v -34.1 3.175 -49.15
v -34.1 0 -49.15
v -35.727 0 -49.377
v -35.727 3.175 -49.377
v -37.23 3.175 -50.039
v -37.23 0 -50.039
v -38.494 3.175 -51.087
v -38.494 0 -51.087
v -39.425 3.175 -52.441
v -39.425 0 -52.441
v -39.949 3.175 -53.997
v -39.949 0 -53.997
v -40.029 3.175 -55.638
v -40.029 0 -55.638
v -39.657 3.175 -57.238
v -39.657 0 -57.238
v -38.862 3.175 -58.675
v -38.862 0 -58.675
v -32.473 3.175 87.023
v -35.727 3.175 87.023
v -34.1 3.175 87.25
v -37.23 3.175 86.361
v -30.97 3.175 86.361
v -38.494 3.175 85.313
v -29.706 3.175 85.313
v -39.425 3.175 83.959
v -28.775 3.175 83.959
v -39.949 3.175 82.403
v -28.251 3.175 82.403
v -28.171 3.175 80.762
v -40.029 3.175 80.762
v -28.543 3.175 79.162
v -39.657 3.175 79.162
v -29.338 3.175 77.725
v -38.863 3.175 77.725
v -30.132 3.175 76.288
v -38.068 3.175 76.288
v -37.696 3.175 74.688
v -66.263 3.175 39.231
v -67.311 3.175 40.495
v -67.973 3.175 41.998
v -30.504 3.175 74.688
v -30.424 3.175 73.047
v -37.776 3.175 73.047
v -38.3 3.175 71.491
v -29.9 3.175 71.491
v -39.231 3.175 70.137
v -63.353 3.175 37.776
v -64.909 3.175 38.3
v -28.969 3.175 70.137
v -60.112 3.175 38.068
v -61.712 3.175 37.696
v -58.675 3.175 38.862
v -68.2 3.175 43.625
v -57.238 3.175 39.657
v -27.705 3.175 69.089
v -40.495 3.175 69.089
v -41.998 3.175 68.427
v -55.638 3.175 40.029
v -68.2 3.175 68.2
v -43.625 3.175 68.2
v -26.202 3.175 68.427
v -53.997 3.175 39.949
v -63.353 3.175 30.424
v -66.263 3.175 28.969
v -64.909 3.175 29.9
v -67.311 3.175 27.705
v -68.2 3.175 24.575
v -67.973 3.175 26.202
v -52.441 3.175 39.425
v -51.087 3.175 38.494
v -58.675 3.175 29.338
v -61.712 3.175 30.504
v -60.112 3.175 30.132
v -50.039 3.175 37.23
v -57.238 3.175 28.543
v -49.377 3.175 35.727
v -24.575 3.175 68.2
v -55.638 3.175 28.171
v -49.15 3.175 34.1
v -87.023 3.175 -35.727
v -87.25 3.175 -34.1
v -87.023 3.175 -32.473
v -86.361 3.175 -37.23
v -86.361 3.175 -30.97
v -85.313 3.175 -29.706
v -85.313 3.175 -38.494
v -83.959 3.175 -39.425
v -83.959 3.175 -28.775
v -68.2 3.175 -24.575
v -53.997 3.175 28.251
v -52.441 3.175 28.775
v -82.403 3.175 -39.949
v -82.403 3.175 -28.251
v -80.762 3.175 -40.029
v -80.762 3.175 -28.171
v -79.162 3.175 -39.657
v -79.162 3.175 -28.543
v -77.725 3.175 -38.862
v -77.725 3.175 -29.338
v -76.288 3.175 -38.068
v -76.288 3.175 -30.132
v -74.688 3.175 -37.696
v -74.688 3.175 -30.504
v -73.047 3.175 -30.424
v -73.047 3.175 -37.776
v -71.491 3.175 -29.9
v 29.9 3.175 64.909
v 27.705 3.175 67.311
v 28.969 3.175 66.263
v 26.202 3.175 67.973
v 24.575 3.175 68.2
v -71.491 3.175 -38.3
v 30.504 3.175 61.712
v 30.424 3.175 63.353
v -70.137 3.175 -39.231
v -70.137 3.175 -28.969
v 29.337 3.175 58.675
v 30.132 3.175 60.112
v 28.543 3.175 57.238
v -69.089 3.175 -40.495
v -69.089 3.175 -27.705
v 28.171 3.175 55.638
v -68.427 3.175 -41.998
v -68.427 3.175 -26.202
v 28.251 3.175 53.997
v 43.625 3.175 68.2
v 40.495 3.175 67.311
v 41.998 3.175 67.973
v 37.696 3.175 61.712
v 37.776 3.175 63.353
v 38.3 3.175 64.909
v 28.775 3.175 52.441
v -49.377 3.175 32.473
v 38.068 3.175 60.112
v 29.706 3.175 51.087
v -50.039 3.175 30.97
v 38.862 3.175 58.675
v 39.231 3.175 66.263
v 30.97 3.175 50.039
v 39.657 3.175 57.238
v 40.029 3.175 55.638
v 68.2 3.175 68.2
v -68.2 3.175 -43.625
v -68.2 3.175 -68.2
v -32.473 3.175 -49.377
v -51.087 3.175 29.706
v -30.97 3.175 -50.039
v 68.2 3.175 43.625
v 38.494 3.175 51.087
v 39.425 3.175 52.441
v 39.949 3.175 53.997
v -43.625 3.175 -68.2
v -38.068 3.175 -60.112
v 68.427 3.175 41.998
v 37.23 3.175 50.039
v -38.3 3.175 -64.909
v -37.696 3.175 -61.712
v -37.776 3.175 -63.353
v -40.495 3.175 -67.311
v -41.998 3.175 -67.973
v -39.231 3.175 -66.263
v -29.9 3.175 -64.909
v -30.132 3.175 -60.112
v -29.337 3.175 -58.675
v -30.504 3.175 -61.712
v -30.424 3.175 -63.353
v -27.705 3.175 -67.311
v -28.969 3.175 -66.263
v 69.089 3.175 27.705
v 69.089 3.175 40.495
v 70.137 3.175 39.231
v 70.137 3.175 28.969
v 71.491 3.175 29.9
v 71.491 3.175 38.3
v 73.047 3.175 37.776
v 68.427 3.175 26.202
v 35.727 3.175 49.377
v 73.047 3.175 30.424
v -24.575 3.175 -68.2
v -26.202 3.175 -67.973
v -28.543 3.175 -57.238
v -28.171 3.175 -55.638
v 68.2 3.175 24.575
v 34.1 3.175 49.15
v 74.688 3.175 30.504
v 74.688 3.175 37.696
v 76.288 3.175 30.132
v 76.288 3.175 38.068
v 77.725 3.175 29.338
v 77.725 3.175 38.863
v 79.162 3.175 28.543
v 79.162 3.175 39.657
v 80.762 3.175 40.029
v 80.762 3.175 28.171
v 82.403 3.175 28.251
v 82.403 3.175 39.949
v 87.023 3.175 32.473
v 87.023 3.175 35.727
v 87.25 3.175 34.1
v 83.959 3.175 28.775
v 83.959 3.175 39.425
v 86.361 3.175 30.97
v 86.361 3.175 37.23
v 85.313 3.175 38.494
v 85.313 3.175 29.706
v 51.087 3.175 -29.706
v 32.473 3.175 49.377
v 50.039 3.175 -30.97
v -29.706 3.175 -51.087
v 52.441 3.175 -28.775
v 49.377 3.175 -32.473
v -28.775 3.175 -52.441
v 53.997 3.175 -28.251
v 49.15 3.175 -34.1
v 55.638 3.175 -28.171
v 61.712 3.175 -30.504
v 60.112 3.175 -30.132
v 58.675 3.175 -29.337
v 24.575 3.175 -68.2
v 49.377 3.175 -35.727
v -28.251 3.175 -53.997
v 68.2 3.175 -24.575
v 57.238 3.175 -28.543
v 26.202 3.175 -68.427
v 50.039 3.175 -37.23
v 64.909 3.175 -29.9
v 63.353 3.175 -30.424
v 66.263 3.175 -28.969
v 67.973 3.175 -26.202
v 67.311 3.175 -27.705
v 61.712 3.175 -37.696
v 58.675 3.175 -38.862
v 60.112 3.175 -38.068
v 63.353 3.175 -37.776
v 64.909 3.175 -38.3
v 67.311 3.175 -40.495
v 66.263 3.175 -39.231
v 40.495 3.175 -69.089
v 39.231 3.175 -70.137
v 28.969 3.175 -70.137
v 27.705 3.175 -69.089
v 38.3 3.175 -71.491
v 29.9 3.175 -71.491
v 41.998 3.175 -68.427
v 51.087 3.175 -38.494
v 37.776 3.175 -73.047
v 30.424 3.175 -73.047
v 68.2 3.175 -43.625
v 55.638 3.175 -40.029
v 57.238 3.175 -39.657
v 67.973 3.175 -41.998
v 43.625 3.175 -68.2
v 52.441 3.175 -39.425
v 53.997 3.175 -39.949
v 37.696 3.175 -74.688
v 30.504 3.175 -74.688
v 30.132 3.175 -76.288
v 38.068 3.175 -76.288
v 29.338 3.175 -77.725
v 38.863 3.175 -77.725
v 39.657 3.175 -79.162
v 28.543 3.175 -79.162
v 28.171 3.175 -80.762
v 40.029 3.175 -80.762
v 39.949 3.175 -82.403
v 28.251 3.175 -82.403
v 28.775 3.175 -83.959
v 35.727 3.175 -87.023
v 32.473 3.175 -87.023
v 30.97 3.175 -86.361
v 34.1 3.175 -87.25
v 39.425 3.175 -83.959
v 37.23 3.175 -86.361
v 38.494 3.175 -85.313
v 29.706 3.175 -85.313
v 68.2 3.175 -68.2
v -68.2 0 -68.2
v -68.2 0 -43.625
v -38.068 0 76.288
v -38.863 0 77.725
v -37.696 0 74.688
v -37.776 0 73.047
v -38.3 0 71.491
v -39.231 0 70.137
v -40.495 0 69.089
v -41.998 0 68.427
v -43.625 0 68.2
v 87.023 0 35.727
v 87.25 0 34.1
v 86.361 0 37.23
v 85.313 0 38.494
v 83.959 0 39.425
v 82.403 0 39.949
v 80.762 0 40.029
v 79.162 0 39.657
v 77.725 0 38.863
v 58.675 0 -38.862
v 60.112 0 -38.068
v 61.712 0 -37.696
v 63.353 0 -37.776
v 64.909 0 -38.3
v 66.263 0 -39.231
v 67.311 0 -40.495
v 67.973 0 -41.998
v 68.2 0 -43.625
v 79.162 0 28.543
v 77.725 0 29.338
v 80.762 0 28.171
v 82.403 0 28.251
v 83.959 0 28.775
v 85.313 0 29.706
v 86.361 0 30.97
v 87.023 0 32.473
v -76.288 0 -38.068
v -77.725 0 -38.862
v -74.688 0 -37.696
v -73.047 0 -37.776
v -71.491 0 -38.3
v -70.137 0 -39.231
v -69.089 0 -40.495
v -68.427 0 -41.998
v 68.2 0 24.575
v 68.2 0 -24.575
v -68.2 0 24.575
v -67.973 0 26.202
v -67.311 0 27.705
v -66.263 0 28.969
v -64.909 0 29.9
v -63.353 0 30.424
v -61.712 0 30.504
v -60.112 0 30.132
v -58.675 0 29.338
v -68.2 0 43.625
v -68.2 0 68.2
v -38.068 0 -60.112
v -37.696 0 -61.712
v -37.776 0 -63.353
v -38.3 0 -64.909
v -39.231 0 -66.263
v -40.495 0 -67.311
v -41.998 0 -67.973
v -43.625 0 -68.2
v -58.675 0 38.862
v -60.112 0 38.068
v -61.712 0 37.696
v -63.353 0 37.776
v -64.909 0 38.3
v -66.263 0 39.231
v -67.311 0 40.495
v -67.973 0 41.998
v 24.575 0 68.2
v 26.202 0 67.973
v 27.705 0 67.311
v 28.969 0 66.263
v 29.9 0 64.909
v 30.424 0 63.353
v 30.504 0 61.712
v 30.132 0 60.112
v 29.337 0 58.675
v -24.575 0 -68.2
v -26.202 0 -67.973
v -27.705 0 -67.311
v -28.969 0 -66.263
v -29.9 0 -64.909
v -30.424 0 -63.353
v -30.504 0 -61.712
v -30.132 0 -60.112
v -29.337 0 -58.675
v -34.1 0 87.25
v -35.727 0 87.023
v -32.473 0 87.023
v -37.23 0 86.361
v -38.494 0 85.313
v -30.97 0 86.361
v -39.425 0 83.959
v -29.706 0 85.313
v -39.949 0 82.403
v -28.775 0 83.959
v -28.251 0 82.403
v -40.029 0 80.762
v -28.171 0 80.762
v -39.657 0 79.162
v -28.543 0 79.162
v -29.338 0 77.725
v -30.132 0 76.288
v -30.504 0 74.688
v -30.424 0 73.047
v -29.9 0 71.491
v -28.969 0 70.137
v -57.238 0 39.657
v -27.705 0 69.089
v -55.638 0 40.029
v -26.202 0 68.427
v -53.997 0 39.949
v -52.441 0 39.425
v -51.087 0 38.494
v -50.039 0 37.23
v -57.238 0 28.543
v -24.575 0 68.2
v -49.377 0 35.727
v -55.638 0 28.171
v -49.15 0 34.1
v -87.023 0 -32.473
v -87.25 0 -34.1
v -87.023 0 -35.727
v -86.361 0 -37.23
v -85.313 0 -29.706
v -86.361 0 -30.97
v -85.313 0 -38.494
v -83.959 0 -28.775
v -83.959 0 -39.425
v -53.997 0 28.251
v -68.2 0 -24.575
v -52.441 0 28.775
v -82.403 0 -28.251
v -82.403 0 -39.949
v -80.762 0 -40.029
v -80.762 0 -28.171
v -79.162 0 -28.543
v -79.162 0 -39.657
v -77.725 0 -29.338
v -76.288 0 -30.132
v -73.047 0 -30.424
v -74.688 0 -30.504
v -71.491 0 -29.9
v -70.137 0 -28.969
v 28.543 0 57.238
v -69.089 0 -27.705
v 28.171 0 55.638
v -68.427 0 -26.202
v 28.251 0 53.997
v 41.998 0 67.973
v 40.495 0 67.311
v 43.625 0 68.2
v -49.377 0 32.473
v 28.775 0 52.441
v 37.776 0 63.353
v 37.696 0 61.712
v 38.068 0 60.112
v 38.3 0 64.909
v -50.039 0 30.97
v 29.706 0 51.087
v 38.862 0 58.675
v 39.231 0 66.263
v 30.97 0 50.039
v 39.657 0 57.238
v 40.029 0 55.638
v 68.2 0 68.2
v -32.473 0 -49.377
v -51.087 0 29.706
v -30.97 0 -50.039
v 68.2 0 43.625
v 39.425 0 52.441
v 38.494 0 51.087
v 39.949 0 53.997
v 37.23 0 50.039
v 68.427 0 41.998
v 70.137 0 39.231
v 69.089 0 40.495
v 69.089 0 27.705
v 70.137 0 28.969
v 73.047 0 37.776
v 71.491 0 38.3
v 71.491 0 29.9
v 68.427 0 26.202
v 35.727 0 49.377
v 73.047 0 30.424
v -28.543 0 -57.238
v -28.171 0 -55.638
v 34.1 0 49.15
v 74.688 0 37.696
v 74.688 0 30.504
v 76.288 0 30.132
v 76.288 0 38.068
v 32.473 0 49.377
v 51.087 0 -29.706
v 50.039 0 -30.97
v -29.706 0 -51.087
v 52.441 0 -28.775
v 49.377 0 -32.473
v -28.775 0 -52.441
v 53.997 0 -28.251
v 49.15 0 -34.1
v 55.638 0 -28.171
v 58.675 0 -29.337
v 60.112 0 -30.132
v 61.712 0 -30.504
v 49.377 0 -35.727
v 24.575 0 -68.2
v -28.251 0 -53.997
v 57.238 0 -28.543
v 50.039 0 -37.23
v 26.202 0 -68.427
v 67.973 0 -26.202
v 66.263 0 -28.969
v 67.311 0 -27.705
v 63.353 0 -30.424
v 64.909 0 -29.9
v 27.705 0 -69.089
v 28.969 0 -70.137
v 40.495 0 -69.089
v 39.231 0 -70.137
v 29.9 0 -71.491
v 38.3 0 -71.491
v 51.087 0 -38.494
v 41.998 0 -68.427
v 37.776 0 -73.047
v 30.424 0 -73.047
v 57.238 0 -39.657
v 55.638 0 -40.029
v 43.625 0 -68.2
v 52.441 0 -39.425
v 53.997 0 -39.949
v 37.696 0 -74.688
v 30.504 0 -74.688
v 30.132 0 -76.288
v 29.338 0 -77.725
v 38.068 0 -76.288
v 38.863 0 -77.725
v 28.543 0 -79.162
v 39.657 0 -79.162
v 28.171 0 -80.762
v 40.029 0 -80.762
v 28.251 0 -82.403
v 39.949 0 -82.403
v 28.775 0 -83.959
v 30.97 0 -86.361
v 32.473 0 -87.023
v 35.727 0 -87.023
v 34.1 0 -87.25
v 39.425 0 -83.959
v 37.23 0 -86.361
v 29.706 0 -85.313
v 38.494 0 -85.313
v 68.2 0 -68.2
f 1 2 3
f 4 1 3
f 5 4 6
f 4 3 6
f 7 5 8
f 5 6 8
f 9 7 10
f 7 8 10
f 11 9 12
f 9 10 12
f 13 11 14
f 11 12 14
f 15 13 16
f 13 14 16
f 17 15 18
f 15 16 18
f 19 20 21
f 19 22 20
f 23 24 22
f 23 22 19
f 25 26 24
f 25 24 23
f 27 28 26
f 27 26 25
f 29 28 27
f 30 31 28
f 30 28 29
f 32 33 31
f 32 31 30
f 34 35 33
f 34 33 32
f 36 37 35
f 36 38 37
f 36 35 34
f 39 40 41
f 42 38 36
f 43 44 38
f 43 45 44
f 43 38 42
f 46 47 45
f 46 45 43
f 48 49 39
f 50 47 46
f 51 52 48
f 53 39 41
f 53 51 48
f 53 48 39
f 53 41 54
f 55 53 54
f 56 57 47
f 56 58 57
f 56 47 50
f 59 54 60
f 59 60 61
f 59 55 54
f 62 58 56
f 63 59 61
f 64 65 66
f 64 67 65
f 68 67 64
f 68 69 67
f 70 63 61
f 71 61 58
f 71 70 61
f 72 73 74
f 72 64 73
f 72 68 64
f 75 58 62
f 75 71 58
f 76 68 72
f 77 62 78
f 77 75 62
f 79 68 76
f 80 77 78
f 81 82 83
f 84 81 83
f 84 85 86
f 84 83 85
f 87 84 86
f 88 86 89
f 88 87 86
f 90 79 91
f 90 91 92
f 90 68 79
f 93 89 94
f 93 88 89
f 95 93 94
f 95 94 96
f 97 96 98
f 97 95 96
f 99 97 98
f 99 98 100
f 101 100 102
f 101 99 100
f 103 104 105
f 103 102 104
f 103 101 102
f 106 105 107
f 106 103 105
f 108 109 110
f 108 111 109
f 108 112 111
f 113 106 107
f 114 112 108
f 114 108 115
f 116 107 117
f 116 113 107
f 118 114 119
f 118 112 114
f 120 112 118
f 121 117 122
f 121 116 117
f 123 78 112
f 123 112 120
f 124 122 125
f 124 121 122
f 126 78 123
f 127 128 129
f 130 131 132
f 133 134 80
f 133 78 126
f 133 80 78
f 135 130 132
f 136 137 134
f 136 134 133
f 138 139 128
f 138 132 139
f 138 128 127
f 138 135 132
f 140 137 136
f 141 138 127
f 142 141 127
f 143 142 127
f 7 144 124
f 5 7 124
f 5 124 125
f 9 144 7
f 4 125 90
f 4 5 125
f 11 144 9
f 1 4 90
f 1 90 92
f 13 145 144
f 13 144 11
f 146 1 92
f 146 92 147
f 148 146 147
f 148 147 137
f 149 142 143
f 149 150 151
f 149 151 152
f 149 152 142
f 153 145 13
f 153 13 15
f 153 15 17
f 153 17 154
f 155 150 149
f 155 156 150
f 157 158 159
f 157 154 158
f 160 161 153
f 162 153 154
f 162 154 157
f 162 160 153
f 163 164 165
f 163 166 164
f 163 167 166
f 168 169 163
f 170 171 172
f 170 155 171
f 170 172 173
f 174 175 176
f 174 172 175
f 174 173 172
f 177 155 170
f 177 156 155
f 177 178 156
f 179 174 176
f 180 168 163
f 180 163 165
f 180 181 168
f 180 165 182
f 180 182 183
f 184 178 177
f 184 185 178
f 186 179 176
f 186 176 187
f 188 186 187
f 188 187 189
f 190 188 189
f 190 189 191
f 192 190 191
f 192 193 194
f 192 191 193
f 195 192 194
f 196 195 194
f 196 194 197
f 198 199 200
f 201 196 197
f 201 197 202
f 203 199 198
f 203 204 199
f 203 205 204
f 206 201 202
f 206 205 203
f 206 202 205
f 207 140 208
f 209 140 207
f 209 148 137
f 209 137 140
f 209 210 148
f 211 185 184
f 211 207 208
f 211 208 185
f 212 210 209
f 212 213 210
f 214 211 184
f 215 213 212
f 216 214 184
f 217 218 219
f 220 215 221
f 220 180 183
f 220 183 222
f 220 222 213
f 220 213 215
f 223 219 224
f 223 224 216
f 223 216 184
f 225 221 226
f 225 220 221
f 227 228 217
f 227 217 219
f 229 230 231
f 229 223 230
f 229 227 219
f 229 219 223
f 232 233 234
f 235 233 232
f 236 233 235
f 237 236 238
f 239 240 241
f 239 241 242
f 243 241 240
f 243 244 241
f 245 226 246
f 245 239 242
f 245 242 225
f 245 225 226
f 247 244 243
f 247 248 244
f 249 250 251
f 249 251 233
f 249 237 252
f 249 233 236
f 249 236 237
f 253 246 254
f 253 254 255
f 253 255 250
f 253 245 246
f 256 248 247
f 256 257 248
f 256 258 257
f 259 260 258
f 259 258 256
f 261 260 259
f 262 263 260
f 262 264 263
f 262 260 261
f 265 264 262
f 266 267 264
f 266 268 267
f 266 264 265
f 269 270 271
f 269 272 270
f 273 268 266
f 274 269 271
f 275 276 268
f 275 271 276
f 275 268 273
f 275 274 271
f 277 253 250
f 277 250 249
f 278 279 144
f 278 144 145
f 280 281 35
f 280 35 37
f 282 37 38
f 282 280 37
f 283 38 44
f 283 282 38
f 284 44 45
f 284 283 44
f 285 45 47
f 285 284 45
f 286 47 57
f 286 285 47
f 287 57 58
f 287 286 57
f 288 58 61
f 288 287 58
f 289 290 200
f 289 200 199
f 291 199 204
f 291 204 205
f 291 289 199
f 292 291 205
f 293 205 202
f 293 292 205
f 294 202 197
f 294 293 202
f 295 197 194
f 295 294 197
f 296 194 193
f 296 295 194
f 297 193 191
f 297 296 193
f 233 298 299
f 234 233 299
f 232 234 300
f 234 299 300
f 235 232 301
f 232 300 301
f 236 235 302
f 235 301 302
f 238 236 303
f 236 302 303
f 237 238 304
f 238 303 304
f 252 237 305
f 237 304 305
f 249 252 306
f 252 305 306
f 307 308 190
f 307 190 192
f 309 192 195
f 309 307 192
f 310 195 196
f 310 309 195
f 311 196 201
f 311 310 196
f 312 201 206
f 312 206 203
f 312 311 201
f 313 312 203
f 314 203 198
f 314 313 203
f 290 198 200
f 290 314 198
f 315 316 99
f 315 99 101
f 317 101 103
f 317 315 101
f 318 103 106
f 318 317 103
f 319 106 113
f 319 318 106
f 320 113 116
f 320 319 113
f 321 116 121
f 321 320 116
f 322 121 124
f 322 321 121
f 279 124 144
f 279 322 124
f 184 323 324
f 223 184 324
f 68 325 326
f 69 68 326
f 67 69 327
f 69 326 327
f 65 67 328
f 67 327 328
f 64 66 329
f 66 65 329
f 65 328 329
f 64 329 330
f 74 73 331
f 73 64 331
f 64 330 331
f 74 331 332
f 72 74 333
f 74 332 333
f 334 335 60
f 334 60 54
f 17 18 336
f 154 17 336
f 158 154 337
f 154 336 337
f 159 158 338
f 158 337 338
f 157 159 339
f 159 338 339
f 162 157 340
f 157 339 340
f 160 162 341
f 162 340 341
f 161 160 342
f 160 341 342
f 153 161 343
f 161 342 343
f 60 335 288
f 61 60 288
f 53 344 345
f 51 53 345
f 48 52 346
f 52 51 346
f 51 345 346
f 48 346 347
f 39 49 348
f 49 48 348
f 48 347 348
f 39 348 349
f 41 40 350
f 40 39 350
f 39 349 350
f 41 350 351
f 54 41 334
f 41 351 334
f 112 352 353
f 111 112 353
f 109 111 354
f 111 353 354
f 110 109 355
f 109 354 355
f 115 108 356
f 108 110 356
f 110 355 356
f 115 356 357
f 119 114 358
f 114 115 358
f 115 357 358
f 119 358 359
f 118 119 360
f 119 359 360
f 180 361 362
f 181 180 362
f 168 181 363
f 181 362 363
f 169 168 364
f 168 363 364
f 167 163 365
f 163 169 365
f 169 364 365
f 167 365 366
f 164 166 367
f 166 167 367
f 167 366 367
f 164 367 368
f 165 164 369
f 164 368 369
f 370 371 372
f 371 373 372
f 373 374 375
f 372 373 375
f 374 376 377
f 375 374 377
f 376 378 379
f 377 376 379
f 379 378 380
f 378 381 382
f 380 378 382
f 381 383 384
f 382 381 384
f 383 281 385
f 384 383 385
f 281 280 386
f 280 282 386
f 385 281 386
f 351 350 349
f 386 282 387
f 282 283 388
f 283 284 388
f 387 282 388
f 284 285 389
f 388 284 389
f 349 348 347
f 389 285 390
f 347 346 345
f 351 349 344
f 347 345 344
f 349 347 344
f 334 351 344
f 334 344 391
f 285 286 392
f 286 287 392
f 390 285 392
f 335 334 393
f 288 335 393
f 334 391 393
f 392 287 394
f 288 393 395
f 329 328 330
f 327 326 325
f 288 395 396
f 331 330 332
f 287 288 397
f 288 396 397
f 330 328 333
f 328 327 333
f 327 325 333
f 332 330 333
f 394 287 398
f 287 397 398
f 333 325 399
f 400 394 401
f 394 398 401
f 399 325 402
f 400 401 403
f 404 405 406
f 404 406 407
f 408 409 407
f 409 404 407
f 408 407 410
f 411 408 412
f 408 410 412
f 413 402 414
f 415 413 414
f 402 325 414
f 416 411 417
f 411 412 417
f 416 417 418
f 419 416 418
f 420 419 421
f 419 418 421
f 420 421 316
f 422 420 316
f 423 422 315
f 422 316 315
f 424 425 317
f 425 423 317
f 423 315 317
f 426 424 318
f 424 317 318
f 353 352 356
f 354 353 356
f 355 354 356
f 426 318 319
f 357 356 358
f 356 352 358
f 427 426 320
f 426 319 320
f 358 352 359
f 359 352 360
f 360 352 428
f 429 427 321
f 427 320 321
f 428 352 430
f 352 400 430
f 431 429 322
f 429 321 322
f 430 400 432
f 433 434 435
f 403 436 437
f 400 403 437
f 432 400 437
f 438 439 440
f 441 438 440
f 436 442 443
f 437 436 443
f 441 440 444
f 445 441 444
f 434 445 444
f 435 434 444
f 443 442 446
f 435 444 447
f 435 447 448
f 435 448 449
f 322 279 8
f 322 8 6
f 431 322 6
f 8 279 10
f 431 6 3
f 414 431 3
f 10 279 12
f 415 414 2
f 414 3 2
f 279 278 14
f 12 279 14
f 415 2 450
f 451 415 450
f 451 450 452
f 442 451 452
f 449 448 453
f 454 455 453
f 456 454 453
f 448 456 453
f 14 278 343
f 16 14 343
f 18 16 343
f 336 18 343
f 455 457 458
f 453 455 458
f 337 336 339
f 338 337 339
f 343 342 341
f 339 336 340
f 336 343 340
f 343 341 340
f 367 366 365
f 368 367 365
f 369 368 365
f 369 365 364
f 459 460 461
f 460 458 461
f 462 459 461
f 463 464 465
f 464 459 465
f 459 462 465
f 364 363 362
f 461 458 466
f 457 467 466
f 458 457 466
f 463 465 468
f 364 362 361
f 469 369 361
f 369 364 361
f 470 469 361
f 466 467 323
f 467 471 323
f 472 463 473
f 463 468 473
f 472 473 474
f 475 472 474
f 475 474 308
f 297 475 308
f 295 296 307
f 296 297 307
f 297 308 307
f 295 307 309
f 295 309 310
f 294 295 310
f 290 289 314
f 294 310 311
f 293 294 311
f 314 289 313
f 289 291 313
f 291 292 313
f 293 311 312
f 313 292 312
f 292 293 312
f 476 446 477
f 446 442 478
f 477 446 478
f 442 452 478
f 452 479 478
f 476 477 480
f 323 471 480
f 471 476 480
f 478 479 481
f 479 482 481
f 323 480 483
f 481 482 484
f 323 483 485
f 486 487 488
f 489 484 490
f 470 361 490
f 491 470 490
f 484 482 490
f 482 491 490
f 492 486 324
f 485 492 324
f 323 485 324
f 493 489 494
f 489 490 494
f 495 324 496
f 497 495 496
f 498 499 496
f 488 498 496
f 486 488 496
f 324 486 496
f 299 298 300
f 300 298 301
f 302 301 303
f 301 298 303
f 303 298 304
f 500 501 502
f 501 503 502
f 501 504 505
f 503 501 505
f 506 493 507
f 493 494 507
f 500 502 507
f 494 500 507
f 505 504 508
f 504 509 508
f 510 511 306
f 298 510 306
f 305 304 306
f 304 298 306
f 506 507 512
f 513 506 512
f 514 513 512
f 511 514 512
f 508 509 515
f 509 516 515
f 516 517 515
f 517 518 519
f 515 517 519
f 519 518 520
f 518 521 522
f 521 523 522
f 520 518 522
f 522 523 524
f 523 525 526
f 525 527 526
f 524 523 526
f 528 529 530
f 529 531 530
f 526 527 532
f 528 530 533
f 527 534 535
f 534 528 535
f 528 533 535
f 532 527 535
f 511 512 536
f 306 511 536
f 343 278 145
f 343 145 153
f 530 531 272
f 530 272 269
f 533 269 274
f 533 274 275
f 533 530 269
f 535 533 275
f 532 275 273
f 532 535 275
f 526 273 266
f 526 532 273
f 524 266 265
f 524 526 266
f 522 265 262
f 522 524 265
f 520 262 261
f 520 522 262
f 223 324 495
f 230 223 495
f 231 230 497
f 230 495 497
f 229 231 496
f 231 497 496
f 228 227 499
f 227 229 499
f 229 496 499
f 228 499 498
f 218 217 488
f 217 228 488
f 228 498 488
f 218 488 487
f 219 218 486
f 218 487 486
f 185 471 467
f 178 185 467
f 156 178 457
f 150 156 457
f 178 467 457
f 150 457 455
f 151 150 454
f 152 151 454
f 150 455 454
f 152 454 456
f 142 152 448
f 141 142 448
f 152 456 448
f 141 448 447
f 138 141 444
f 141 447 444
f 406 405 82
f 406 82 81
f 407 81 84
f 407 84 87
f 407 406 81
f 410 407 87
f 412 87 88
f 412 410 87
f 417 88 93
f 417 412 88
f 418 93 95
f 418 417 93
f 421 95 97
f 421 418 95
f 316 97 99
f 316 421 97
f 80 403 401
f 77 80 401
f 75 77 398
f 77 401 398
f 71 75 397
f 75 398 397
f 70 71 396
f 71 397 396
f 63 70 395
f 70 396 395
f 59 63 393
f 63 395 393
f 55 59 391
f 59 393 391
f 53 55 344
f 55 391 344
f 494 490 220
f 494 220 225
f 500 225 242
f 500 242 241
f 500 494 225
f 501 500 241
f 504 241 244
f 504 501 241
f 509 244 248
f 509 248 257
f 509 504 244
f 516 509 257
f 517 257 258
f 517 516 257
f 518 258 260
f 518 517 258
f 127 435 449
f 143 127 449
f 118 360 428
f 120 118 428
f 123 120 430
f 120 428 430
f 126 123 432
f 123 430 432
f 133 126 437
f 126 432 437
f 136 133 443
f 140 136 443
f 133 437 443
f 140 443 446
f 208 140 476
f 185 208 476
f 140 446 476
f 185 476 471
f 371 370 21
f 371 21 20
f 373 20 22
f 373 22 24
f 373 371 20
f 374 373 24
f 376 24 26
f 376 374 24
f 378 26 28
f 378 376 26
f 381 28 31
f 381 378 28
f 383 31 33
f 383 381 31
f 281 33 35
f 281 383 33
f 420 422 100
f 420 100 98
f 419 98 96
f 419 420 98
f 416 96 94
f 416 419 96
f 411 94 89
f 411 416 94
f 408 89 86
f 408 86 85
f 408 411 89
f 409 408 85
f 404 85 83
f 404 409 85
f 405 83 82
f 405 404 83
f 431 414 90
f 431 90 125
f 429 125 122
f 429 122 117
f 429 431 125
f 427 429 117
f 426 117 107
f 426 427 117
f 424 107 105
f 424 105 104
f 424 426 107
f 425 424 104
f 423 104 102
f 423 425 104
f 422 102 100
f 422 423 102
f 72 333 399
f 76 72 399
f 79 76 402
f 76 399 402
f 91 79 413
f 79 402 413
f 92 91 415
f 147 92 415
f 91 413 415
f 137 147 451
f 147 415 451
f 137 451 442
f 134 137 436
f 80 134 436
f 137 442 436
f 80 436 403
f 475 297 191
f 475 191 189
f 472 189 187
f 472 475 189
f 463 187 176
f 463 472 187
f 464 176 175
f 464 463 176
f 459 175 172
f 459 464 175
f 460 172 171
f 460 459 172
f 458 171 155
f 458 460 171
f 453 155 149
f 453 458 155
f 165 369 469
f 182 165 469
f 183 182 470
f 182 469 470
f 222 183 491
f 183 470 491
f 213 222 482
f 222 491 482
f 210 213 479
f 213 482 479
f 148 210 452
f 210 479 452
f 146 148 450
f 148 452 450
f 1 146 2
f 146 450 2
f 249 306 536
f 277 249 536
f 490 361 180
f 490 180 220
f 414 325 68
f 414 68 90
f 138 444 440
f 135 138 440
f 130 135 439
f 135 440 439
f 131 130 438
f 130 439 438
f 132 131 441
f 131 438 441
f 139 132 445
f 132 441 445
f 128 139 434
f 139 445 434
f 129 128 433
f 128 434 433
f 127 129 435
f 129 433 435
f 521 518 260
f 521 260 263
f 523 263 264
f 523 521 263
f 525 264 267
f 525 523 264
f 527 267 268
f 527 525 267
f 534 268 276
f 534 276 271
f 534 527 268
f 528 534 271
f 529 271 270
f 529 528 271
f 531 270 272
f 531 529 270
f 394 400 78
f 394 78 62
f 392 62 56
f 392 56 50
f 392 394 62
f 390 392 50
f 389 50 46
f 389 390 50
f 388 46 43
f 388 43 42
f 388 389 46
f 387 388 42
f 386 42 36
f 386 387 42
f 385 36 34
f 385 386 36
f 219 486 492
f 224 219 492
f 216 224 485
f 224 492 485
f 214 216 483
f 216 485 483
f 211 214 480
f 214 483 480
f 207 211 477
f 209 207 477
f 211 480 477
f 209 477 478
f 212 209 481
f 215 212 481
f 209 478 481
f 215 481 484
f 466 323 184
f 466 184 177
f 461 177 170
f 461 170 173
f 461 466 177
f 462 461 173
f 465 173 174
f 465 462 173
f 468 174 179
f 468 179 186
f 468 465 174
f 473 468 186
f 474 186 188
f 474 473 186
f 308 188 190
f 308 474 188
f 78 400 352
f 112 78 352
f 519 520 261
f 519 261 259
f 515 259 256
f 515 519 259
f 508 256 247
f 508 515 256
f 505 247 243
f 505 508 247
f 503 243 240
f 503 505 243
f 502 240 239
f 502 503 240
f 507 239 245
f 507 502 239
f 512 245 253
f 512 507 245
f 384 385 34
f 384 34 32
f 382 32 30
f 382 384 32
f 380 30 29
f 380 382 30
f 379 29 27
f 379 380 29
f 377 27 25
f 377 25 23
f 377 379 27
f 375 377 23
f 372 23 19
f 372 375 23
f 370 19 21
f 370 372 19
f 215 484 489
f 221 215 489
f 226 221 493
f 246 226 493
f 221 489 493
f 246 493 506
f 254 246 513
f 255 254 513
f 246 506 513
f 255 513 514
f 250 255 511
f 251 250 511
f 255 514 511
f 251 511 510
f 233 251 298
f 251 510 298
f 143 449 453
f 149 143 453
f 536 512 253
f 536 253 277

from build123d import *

# Parameters (mm, degrees)
SKETCH1_W           = 136.4
SKETCH1_H           = 136.4
BOSS_EXTRUDE1_DEPTH = 3.175
BOSS_EXTRUDE2_DEPTH = 3.175
CUT_EXTRUDE2_DEPTH  = 111.78755853
CIRPATTERN1_COUNT   = 4


with BuildPart() as part:
    # Sketch1 → Boss-Extrude1 (new body)
    with BuildSketch(Plane(origin=(0, 0, 0), x_dir=(1, 0, 0), z_dir=(0, 1, 0))):
        Rectangle(SKETCH1_W, SKETCH1_H)
    extrude(amount=BOSS_EXTRUDE1_DEPTH)

    # Sketch2 → Boss-Extrude2 (add)
    with BuildSketch(Plane(origin=(0, 0, 0), x_dir=(1, 0, 0), z_dir=(0, 1, 0))):
        with BuildLine():
            Line((-68.2, 43.625), (-68.2, 24.575))
            ThreePointArc((-68.2, 24.575), (-71.490806564, 29.899636871), (-77.725, 29.3375))
            ThreePointArc((-77.725, 29.3375), (-83.959193436, 28.775363129), (-87.25, 34.1))
            ThreePointArc((-87.25, 34.1), (-83.959193436, 39.424636871), (-77.725, 38.8625))
            ThreePointArc((-77.725, 38.8625), (-71.490806564, 38.300363129), (-68.2, 43.625))
        make_face()
    boss_extrude2 = extrude(amount=BOSS_EXTRUDE2_DEPTH)

    # Sketch2<3> → Cut-Extrude2 (cut, through all)
    with BuildSketch(Plane(origin=(0, 0, 0), x_dir=(1, 0, 0), z_dir=(0, 1, 0))):
        with BuildLine():
            Line((-68.2, -43.625), (-68.2, -24.575))
            ThreePointArc((-68.2, -24.575), (-64.909193436, -29.899636871), (-58.675, -29.3375))
            ThreePointArc((-58.675, -29.3375), (-52.440806564, -28.775363129), (-49.15, -34.1))
            ThreePointArc((-49.15, -34.1), (-52.440806564, -39.424636871), (-58.675, -38.8625))
            ThreePointArc((-58.675, -38.8625), (-64.909193436, -38.300363129), (-68.2, -43.625))
        make_face()
    cut_extrude2 = extrude(amount=CUT_EXTRUDE2_DEPTH, mode=Mode.SUBTRACT)

    # CirPattern1: Boss-Extrude2, Cut-Extrude2 ×4 about axis
    cirpattern1_axis = Axis((0, 0, 0), (0, 1, 0))
    add([boss_extrude2.rotate(cirpattern1_axis, i * 360 / CIRPATTERN1_COUNT) for i in range(1, CIRPATTERN1_COUNT)])
    add([cut_extrude2.rotate(cirpattern1_axis, i * 360 / CIRPATTERN1_COUNT) for i in range(1, CIRPATTERN1_COUNT)], mode=Mode.SUBTRACT)


solid = part.part
